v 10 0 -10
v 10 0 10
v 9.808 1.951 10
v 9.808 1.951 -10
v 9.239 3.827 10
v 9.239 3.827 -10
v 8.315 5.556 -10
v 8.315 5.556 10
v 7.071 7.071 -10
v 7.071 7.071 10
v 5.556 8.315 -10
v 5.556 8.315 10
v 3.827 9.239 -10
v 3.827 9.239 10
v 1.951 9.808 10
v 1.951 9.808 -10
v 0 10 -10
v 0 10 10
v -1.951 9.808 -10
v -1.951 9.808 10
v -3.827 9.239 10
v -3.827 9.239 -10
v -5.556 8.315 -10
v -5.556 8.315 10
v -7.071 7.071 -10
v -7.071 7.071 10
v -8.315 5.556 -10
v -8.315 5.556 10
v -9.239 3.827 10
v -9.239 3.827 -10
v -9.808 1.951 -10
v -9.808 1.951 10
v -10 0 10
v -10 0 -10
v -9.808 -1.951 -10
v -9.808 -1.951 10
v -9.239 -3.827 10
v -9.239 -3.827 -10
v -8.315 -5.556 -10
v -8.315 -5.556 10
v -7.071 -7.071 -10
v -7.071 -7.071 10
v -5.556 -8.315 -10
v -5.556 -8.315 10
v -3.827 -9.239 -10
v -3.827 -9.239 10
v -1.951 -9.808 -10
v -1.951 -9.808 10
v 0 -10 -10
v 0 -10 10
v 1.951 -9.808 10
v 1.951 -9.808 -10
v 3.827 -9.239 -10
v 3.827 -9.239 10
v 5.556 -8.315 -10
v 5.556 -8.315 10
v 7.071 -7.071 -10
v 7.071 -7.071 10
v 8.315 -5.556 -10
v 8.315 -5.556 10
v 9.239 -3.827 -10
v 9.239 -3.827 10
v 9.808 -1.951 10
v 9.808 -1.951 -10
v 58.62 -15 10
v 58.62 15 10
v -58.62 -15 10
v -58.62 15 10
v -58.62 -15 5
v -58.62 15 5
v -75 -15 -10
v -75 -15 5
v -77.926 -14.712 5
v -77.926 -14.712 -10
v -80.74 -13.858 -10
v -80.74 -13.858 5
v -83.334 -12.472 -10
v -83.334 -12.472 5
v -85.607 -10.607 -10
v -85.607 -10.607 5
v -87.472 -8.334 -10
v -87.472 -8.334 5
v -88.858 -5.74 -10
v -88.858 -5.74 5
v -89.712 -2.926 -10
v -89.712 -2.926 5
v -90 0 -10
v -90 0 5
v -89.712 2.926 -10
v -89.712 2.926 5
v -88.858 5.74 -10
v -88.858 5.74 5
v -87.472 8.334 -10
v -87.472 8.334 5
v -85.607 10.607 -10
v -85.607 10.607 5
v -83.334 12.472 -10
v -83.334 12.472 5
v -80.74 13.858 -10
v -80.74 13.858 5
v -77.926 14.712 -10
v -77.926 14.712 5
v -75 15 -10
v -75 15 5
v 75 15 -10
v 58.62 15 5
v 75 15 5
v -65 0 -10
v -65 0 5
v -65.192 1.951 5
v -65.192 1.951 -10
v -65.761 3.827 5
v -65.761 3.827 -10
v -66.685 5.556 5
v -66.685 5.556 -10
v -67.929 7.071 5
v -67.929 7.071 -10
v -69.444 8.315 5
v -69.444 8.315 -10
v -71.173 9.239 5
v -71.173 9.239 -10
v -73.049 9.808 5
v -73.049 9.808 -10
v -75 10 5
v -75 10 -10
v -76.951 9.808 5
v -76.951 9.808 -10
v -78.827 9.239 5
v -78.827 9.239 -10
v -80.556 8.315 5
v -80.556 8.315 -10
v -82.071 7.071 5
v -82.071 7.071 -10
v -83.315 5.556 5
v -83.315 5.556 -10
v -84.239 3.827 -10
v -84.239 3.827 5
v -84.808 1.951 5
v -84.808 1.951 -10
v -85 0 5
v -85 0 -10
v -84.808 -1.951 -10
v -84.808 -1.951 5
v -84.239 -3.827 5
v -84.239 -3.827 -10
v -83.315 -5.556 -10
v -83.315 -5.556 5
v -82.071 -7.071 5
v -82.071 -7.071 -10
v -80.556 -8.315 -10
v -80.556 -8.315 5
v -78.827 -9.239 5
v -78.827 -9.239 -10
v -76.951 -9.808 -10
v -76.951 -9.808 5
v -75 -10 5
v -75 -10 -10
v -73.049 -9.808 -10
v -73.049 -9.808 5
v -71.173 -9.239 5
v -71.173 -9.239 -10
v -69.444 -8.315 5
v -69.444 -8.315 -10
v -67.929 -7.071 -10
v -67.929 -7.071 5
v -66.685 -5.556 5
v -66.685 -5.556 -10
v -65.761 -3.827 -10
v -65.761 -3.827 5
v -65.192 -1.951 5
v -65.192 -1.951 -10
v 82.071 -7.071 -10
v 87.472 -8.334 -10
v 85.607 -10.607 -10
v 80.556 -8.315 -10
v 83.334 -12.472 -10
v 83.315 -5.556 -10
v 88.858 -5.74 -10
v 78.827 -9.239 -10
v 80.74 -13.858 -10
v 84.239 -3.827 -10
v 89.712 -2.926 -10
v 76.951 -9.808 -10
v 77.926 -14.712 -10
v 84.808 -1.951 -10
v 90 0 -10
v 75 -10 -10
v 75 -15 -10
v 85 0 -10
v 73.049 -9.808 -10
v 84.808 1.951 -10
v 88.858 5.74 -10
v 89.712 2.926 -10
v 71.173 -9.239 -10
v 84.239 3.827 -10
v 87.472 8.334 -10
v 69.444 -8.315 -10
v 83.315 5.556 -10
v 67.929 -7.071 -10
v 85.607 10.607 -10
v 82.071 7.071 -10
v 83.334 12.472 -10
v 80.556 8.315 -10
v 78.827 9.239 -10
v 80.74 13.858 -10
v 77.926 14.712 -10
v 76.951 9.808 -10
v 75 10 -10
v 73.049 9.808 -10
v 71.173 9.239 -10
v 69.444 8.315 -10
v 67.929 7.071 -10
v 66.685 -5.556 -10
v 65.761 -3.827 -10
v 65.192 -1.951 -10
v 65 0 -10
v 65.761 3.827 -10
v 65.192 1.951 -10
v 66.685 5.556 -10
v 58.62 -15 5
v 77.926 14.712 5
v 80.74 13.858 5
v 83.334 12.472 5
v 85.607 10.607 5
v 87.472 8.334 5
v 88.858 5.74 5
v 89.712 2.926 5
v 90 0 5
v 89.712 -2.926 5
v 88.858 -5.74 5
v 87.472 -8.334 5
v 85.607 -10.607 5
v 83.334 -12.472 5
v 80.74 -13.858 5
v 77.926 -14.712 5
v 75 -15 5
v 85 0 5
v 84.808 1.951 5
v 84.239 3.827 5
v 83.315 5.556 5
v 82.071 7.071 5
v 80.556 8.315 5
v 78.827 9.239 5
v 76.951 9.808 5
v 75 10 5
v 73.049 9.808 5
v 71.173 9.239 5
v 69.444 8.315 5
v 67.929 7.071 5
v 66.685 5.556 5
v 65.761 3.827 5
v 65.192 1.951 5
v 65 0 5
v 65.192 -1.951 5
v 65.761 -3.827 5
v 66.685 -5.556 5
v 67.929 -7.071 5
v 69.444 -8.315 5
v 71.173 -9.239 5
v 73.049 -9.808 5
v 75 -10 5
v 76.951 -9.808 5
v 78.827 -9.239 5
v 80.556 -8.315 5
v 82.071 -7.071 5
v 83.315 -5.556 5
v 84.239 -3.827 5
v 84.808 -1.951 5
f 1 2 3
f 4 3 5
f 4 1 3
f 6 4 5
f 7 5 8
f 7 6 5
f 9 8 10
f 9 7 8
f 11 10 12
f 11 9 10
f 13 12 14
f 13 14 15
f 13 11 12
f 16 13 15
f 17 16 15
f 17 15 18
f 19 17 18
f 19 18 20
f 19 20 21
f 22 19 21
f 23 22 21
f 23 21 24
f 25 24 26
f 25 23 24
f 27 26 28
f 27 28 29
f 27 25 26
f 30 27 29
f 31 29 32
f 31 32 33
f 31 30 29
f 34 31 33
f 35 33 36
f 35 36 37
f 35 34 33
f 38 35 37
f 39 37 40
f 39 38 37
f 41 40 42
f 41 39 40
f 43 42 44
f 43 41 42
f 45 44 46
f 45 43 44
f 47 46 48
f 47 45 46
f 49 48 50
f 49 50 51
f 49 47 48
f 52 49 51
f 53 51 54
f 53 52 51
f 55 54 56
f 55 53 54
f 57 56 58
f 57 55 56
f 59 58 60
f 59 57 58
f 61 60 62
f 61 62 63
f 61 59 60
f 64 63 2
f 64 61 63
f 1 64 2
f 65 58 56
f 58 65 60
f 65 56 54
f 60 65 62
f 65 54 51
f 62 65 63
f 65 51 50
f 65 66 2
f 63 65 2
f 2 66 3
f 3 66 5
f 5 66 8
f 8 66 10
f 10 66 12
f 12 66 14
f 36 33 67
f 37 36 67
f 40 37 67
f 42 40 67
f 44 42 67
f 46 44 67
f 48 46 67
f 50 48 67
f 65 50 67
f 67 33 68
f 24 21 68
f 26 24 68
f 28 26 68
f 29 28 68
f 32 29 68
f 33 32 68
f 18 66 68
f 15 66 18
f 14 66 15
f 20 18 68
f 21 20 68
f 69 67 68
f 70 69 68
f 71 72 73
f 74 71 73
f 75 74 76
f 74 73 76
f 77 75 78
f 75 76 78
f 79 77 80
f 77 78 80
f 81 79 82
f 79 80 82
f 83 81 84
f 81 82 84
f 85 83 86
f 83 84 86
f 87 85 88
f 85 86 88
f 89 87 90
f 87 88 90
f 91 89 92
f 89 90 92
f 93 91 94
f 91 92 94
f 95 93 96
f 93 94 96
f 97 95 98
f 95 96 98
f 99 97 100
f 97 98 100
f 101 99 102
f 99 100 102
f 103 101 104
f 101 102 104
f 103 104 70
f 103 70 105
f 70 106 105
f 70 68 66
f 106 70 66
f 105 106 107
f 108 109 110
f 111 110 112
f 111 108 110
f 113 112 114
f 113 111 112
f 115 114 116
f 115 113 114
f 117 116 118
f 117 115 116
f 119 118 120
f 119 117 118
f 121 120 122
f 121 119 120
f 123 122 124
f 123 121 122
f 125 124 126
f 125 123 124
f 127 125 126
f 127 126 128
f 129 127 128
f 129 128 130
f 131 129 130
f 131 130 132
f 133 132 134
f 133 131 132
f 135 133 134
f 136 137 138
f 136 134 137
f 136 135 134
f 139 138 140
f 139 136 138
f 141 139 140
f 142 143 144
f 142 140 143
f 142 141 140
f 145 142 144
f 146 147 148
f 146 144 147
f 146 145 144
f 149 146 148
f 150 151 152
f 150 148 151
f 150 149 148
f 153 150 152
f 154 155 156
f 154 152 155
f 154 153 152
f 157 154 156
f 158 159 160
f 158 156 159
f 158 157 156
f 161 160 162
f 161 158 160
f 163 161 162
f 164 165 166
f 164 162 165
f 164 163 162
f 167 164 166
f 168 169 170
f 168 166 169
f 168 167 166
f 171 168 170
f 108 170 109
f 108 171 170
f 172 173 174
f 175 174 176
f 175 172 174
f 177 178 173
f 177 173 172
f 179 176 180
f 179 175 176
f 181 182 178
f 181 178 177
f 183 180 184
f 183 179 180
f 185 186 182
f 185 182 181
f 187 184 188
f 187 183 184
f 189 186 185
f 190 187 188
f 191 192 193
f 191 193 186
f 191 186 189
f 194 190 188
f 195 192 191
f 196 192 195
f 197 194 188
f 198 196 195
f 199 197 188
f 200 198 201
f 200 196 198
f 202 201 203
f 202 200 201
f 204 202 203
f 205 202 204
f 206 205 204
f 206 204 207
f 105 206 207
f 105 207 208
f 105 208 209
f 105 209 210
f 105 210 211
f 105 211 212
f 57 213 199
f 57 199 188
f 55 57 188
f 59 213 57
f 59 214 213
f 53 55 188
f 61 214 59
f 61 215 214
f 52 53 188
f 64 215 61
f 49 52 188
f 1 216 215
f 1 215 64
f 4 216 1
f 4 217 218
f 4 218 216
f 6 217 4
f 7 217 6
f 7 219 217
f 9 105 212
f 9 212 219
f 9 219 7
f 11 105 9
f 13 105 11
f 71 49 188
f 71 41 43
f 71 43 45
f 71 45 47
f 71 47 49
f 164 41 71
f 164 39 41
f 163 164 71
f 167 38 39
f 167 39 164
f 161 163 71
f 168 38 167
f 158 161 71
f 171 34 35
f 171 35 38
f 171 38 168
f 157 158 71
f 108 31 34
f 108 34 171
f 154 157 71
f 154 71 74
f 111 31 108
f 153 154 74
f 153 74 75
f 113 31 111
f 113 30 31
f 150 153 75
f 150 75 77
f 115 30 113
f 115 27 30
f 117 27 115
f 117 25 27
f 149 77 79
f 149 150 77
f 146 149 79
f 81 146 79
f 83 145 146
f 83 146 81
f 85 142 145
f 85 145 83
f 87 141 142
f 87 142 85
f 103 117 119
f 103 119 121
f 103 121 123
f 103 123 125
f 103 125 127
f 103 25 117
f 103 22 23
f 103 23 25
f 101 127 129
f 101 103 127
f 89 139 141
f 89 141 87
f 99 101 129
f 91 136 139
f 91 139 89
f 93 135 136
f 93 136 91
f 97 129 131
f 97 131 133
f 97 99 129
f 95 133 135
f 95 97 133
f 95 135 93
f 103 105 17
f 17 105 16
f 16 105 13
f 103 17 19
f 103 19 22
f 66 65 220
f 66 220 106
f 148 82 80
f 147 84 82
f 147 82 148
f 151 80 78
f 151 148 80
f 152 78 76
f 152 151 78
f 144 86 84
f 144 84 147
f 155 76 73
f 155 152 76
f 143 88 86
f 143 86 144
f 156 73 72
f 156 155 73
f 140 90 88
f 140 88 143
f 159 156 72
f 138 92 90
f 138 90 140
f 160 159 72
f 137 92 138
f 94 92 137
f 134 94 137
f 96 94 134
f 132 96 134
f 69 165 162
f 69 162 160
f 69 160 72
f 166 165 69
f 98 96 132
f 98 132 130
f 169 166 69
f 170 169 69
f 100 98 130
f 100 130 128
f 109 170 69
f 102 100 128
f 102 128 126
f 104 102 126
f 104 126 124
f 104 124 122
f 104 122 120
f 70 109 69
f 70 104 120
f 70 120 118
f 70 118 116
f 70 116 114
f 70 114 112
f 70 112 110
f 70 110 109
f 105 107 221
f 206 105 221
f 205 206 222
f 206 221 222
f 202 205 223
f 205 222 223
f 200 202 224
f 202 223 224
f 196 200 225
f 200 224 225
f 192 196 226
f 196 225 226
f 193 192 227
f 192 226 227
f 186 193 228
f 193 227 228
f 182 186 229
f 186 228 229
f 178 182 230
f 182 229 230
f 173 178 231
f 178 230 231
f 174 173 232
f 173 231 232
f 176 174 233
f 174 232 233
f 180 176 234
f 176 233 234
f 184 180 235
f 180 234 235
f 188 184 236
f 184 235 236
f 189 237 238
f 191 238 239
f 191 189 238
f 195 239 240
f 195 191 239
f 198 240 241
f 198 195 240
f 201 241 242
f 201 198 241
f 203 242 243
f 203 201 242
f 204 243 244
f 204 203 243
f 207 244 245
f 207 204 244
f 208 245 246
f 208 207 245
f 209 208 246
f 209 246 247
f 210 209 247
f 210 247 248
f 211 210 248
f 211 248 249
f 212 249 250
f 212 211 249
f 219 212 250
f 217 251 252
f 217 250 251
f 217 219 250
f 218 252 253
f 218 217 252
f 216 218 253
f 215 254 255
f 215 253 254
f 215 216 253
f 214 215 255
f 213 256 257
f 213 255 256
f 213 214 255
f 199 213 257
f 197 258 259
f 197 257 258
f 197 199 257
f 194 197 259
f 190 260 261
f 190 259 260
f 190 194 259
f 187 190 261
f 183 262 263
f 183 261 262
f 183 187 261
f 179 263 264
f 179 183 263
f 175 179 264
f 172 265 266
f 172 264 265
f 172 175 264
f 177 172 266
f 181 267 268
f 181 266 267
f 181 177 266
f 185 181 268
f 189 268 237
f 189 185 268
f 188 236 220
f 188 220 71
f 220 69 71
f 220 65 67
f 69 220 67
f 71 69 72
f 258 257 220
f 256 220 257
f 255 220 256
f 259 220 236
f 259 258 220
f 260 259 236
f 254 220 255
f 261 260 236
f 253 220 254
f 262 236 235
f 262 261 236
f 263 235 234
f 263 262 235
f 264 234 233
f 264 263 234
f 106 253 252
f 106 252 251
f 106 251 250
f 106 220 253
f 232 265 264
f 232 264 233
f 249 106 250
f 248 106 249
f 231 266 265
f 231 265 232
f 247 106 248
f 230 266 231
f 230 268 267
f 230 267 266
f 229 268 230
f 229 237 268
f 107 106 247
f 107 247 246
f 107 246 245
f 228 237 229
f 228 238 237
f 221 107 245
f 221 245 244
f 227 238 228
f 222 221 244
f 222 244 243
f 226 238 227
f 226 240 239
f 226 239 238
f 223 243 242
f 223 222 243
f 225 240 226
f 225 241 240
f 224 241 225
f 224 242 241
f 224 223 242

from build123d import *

# Parameters (mm, degrees)
SKETCH_1_R          = 10
EXTRUDE_1_DEPTH     = 10
SKETCH_2_W          = 35.259791695
SKETCH_2_H          = 30
CUT_EXTRUDE_1_DEPTH = 5


with BuildPart() as part:
    # Эскиз1 → Бобышка-Вытянуть1 (new, symmetric)
    with BuildSketch(Plane.XY):
        with BuildLine():
            Line((-75, 15), (75, 15))
            ThreePointArc((75, 15), (90, 0), (75, -15))
            Line((75, -15), (-75, -15))
            ThreePointArc((-75, -15), (-90, 0), (-75, 15))
        make_face()
        with Locations((-75, 0)):
            Circle(SKETCH_1_R, mode=Mode.SUBTRACT)
        Circle(SKETCH_1_R, mode=Mode.SUBTRACT)
        with Locations((75, 0)):
            Circle(SKETCH_1_R, mode=Mode.SUBTRACT)
    extrude(amount=EXTRUDE_1_DEPTH, both=True)

    # Эскиз2 → Вырез-Вытянуть1 (cut)
    with BuildSketch(Plane.XY.offset(10)):
        with Locations((-76.250006928, 0)):
            Rectangle(SKETCH_2_W, SKETCH_2_H)
        with Locations((76.250006928, 0)):
            Rectangle(SKETCH_2_W, SKETCH_2_H)
    extrude(amount=-CUT_EXTRUDE_1_DEPTH, mode=Mode.SUBTRACT)


solid = part.part
